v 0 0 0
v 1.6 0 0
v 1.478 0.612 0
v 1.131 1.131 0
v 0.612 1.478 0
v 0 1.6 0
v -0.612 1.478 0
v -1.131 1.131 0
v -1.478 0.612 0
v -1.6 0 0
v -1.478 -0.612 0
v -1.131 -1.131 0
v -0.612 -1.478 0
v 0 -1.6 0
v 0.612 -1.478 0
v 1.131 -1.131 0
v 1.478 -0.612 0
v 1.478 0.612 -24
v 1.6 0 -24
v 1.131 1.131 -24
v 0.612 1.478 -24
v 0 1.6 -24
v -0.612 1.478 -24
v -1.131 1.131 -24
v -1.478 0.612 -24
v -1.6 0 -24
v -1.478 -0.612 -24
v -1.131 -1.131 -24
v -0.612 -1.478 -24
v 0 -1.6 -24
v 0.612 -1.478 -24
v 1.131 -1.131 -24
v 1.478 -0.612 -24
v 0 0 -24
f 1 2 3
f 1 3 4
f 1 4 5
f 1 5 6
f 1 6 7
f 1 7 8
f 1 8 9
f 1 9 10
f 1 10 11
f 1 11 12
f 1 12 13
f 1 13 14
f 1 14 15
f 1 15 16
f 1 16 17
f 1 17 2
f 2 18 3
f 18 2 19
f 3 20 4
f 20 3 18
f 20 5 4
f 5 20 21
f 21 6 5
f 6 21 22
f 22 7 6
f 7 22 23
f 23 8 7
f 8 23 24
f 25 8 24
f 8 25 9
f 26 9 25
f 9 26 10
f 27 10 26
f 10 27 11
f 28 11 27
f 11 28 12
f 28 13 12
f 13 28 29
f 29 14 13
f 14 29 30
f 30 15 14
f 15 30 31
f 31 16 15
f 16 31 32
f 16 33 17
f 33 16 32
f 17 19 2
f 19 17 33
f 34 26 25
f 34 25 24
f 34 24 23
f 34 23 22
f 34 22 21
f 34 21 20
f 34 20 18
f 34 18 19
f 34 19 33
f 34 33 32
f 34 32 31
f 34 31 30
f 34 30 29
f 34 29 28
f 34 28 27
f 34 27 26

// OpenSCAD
// file: ../p/4-4edge.scad
use <../lib.scad>
function ldraw_lib__4_4edge() = [
// 0 Circle 1.0
// 0 Name: 4-4edge.dat
// 0 Author: James Jessiman
// 0 !LDRAW_ORG Primitive UPDATE 2017-01
// 0 !LICENSE Licensed under CC BY 2.0 and CC BY 4.0 : see CAreadme.txt
// 
// 0 BFC CERTIFY CCW
  [0,"BFC","CERTIFY"],
  [0,"BFC","CCW"],
// 
// 0 !HISTORY 1998-12-15 [PTadmin] Official Update 1998-10
// 0 !HISTORY 2005-12-28 [PTadmin] Official Update 2005-01
// 0 !HISTORY 2007-06-24 [PTadmin] Header formatted for Contributor Agreement
// 0 !HISTORY 2008-07-01 [PTadmin] Official Update 2008-01
// 0 !HISTORY 2017-01-15 [Steffen] BFCed
// 0 !HISTORY 2017-12-30 [PTadmin] Official Update 2017-01
// 
// 
// 2 24 1 0 0 0.9239 0 0.3827
  [2,24,1,0,0,0.9239,0,0.3827],
// 2 24 0.9239 0 0.3827 0.7071 0 0.7071
  [2,24,0.9239,0,0.3827,0.7071,0,0.7071],
// 2 24 0.7071 0 0.7071 0.3827 0 0.9239
  [2,24,0.7071,0,0.7071,0.3827,0,0.9239],
// 2 24 0.3827 0 0.9239 0 0 1
  [2,24,0.3827,0,0.9239,0,0,1],
// 2 24 0 0 1 -0.3827 0 0.9239
  [2,24,0,0,1,-0.3827,0,0.9239],
// 2 24 -0.3827 0 0.9239 -0.7071 0 0.7071
  [2,24,-0.3827,0,0.9239,-0.7071,0,0.7071],
// 2 24 -0.7071 0 0.7071 -0.9239 0 0.3827
  [2,24,-0.7071,0,0.7071,-0.9239,0,0.3827],
// 2 24 -0.9239 0 0.3827 -1 0 -0
  [2,24,-0.9239,0,0.3827,-1,0,-0],
// 2 24 -1 0 -0 -0.9239 0 -0.3827
  [2,24,-1,0,-0,-0.9239,0,-0.3827],
// 2 24 -0.9239 0 -0.3827 -0.7071 0 -0.7071
  [2,24,-0.9239,0,-0.3827,-0.7071,0,-0.7071],
// 2 24 -0.7071 0 -0.7071 -0.3827 0 -0.9239
  [2,24,-0.7071,0,-0.7071,-0.3827,0,-0.9239],
// 2 24 -0.3827 0 -0.9239 0 0 -1
  [2,24,-0.3827,0,-0.9239,0,0,-1],
// 2 24 0 0 -1 0.3827 0 -0.9239
  [2,24,0,0,-1,0.3827,0,-0.9239],
// 2 24 0.3827 0 -0.9239 0.7071 0 -0.7071
  [2,24,0.3827,0,-0.9239,0.7071,0,-0.7071],
// 2 24 0.7071 0 -0.7071 0.9239 0 -0.3827
  [2,24,0.7071,0,-0.7071,0.9239,0,-0.3827],
// 2 24 0.9239 0 -0.3827 1 0 0
  [2,24,0.9239,0,-0.3827,1,0,0],
];
makepoly(ldraw_lib__4_4edge(), line=0.2);
// file: ../p/4-4disc.scad
use <../lib.scad>
function ldraw_lib__4_4disc() = [
// 0 Disc 1.0
// 0 Name: 4-4disc.dat
// 0 Author: James Jessiman
// 0 !LDRAW_ORG Primitive UPDATE 2002-02
// 0 !LICENSE Licensed under CC BY 2.0 and CC BY 4.0 : see CAreadme.txt
// 
// 0 BFC CERTIFY CCW
  [0,"BFC","CERTIFY"],
  [0,"BFC","CCW"],
// 
// 0 !HISTORY 1998-12-15 [PTadmin] Official Update 1998-10
// 0 !HISTORY 2002-03-23 [sbliss] Added BFC statement
// 0 !HISTORY 2002-04-25 [PTadmin] Official Update 2002-02
// 0 !HISTORY 2007-06-24 [PTadmin] Header formatted for Contributor Agreement
// 0 !HISTORY 2008-07-01 [PTadmin] Official Update 2008-01
// 
// 
// 3 16 0 0 0 1 0 0 0.9239 0 0.3827
  [3,16,0,0,0,1,0,0,0.9239,0,0.3827],
// 3 16 0 0 0 0.9239 0 0.3827 0.7071 0 0.7071
  [3,16,0,0,0,0.9239,0,0.3827,0.7071,0,0.7071],
// 3 16 0 0 0 0.7071 0 0.7071 0.3827 0 0.9239
  [3,16,0,0,0,0.7071,0,0.7071,0.3827,0,0.9239],
// 3 16 0 0 0 0.3827 0 0.9239 0 0 1
  [3,16,0,0,0,0.3827,0,0.9239,0,0,1],
// 3 16 0 0 0 0 0 1 -0.3827 0 0.9239
  [3,16,0,0,0,0,0,1,-0.3827,0,0.9239],
// 3 16 0 0 0 -0.3827 0 0.9239 -0.7071 0 0.7071
  [3,16,0,0,0,-0.3827,0,0.9239,-0.7071,0,0.7071],
// 3 16 0 0 0 -0.7071 0 0.7071 -0.9239 0 0.3827
  [3,16,0,0,0,-0.7071,0,0.7071,-0.9239,0,0.3827],
// 3 16 0 0 0 -0.9239 0 0.3827 -1 0 -0
  [3,16,0,0,0,-0.9239,0,0.3827,-1,0,-0],
// 3 16 0 0 0 -1 0 -0 -0.9239 0 -0.3827
  [3,16,0,0,0,-1,0,-0,-0.9239,0,-0.3827],
// 3 16 0 0 0 -0.9239 0 -0.3827 -0.7071 0 -0.7071
  [3,16,0,0,0,-0.9239,0,-0.3827,-0.7071,0,-0.7071],
// 3 16 0 0 0 -0.7071 0 -0.7071 -0.3827 0 -0.9239
  [3,16,0,0,0,-0.7071,0,-0.7071,-0.3827,0,-0.9239],
// 3 16 0 0 0 -0.3827 0 -0.9239 0 0 -1
  [3,16,0,0,0,-0.3827,0,-0.9239,0,0,-1],
// 3 16 0 0 0 0 0 -1 0.3827 0 -0.9239
  [3,16,0,0,0,0,0,-1,0.3827,0,-0.9239],
// 3 16 0 0 0 0.3827 0 -0.9239 0.7071 0 -0.7071
  [3,16,0,0,0,0.3827,0,-0.9239,0.7071,0,-0.7071],
// 3 16 0 0 0 0.7071 0 -0.7071 0.9239 0 -0.3827
  [3,16,0,0,0,0.7071,0,-0.7071,0.9239,0,-0.3827],
// 3 16 0 0 0 0.9239 0 -0.3827 1 0 0
  [3,16,0,0,0,0.9239,0,-0.3827,1,0,0],
// 0
];
makepoly(ldraw_lib__4_4disc(), line=0.2);
// file: ../p/4-4cyli.scad
use <../lib.scad>
function ldraw_lib__4_4cyli() = [
// 0 Cylinder 1.0
// 0 Name: 4-4cyli.dat
// 0 Author: James Jessiman
// 0 !LDRAW_ORG Primitive UPDATE 2005-01
// 0 !LICENSE Licensed under CC BY 2.0 and CC BY 4.0 : see CAreadme.txt
// 
// 0 BFC CERTIFY CCW
  [0,"BFC","CERTIFY"],
  [0,"BFC","CCW"],
// 
// 0 !HISTORY 1998-12-15 [PTadmin] Official Update 1998-10
// 0 !HISTORY 2002-03-23 [sbliss] Added BFC statement; merged headers from files in distributions LDraw 0.27 and Complete.
// 0 !HISTORY 2002-04-25 [PTadmin] Official Update 2002-02
// 0 !HISTORY 2004-12-14 [guyvivan] BFC CCW
// 0 !HISTORY 2005-12-28 [PTadmin] Official Update 2005-01
// 0 !HISTORY 2007-06-24 [PTadmin] Header formatted for Contributor Agreement
// 0 !HISTORY 2008-07-01 [PTadmin] Official Update 2008-01
// 
// 
// 4 16 1 1 0 0.9239 1 0.3827 0.9239 0 0.3827 1 0 0
  [4,16,1,1,0,0.9239,1,0.3827,0.9239,0,0.3827,1,0,0],
// 5 24 1 0 0 1 1 0 0.9239 0 0.3827 0.9239 0 -0.3827
  [5,24,1,0,0,1,1,0,0.9239,0,0.3827,0.9239,0,-0.3827],
// 4 16 0.9239 1 0.3827 0.7071 1 0.7071 0.7071 0 0.7071 0.9239 0 0.3827
  [4,16,0.9239,1,0.3827,0.7071,1,0.7071,0.7071,0,0.7071,0.9239,0,0.3827],
// 5 24 0.9239 0 0.3827 0.9239 1 0.3827 0.7071 0 0.7071 1 0 0
  [5,24,0.9239,0,0.3827,0.9239,1,0.3827,0.7071,0,0.7071,1,0,0],
// 4 16 0.7071 1 0.7071 0.3827 1 0.9239 0.3827 0 0.9239 0.7071 0 0.7071
  [4,16,0.7071,1,0.7071,0.3827,1,0.9239,0.3827,0,0.9239,0.7071,0,0.7071],
// 5 24 0.7071 0 0.7071 0.7071 1 0.7071 0.3827 0 0.9239 0.9239 0 0.3827
  [5,24,0.7071,0,0.7071,0.7071,1,0.7071,0.3827,0,0.9239,0.9239,0,0.3827],
// 4 16 0.3827 1 0.9239 0 1 1 0 0 1 0.3827 0 0.9239
  [4,16,0.3827,1,0.9239,0,1,1,0,0,1,0.3827,0,0.9239],
// 5 24 0.3827 0 0.9239 0.3827 1 0.9239 0 0 1 0.7071 0 0.7071
  [5,24,0.3827,0,0.9239,0.3827,1,0.9239,0,0,1,0.7071,0,0.7071],
// 4 16 0 1 1 -0.3827 1 0.9239 -0.3827 0 0.9239 0 0 1
  [4,16,0,1,1,-0.3827,1,0.9239,-0.3827,0,0.9239,0,0,1],
// 5 24 0 0 1 0 1 1 -0.3827 0 0.9239 0.3827 0 0.9239
  [5,24,0,0,1,0,1,1,-0.3827,0,0.9239,0.3827,0,0.9239],
// 4 16 -0.3827 1 0.9239 -0.7071 1 0.7071 -0.7071 0 0.7071 -0.3827 0 0.9239
  [4,16,-0.3827,1,0.9239,-0.7071,1,0.7071,-0.7071,0,0.7071,-0.3827,0,0.9239],
// 5 24 -0.3827 0 0.9239 -0.3827 1 0.9239 -0.7071 0 0.7071 0 0 1
  [5,24,-0.3827,0,0.9239,-0.3827,1,0.9239,-0.7071,0,0.7071,0,0,1],
// 4 16 -0.7071 1 0.7071 -0.9239 1 0.3827 -0.9239 0 0.3827 -0.7071 0 0.7071
  [4,16,-0.7071,1,0.7071,-0.9239,1,0.3827,-0.9239,0,0.3827,-0.7071,0,0.7071],
// 5 24 -0.7071 0 0.7071 -0.7071 1 0.7071 -0.9239 0 0.3827 -0.3827 0 0.9239
  [5,24,-0.7071,0,0.7071,-0.7071,1,0.7071,-0.9239,0,0.3827,-0.3827,0,0.9239],
// 4 16 -0.9239 1 0.3827 -1 1 0 -1 0 0 -0.9239 0 0.3827
  [4,16,-0.9239,1,0.3827,-1,1,0,-1,0,0,-0.9239,0,0.3827],
// 5 24 -0.9239 0 0.3827 -0.9239 1 0.3827 -1 0 0 -0.7071 0 0.7071
  [5,24,-0.9239,0,0.3827,-0.9239,1,0.3827,-1,0,0,-0.7071,0,0.7071],
// 4 16 -1 1 0 -0.9239 1 -0.3827 -0.9239 0 -0.3827 -1 0 0
  [4,16,-1,1,0,-0.9239,1,-0.3827,-0.9239,0,-0.3827,-1,0,0],
// 5 24 -1 0 0 -1 1 0 -0.9239 0 -0.3827 -0.9239 0 0.3827
  [5,24,-1,0,0,-1,1,0,-0.9239,0,-0.3827,-0.9239,0,0.3827],
// 4 16 -0.9239 1 -0.3827 -0.7071 1 -0.7071 -0.7071 0 -0.7071 -0.9239 0 -0.3827
  [4,16,-0.9239,1,-0.3827,-0.7071,1,-0.7071,-0.7071,0,-0.7071,-0.9239,0,-0.3827],
// 5 24 -0.9239 0 -0.3827 -0.9239 1 -0.3827 -0.7071 0 -0.7071 -1 0 0
  [5,24,-0.9239,0,-0.3827,-0.9239,1,-0.3827,-0.7071,0,-0.7071,-1,0,0],
// 4 16 -0.7071 1 -0.7071 -0.3827 1 -0.9239 -0.3827 0 -0.9239 -0.7071 0 -0.7071
  [4,16,-0.7071,1,-0.7071,-0.3827,1,-0.9239,-0.3827,0,-0.9239,-0.7071,0,-0.7071],
// 5 24 -0.7071 0 -0.7071 -0.7071 1 -0.7071 -0.3827 0 -0.9239 -0.9239 0 -0.3827
  [5,24,-0.7071,0,-0.7071,-0.7071,1,-0.7071,-0.3827,0,-0.9239,-0.9239,0,-0.3827],
// 4 16 -0.3827 1 -0.9239 0 1 -1 0 0 -1 -0.3827 0 -0.9239
  [4,16,-0.3827,1,-0.9239,0,1,-1,0,0,-1,-0.3827,0,-0.9239],
// 5 24 -0.3827 0 -0.9239 -0.3827 1 -0.9239 0 0 -1 -0.7071 0 -0.7071
  [5,24,-0.3827,0,-0.9239,-0.3827,1,-0.9239,0,0,-1,-0.7071,0,-0.7071],
// 4 16 0 1 -1 0.3827 1 -0.9239 0.3827 0 -0.9239 0 0 -1
  [4,16,0,1,-1,0.3827,1,-0.9239,0.3827,0,-0.9239,0,0,-1],
// 5 24 0 0 -1 0 1 -1 0.3827 0 -0.9239 -0.3827 0 -0.9239
  [5,24,0,0,-1,0,1,-1,0.3827,0,-0.9239,-0.3827,0,-0.9239],
// 4 16 0.3827 1 -0.9239 0.7071 1 -0.7071 0.7071 0 -0.7071 0.3827 0 -0.9239
  [4,16,0.3827,1,-0.9239,0.7071,1,-0.7071,0.7071,0,-0.7071,0.3827,0,-0.9239],
// 5 24 0.3827 0 -0.9239 0.3827 1 -0.9239 0.7071 0 -0.7071 0 0 -1
  [5,24,0.3827,0,-0.9239,0.3827,1,-0.9239,0.7071,0,-0.7071,0,0,-1],
// 4 16 0.7071 1 -0.7071 0.9239 1 -0.3827 0.9239 0 -0.3827 0.7071 0 -0.7071
  [4,16,0.7071,1,-0.7071,0.9239,1,-0.3827,0.9239,0,-0.3827,0.7071,0,-0.7071],
// 5 24 0.7071 0 -0.7071 0.7071 1 -0.7071 0.9239 0 -0.3827 0.3827 0 -0.9239
  [5,24,0.7071,0,-0.7071,0.7071,1,-0.7071,0.9239,0,-0.3827,0.3827,0,-0.9239],
// 4 16 0.9239 1 -0.3827 1 1 0 1 0 0 0.9239 0 -0.3827
  [4,16,0.9239,1,-0.3827,1,1,0,1,0,0,0.9239,0,-0.3827],
// 5 24 0.9239 0 -0.3827 0.9239 1 -0.3827 1 0 0 0.7071 0 -0.7071
  [5,24,0.9239,0,-0.3827,0.9239,1,-0.3827,1,0,0,0.7071,0,-0.7071],
// 0
];
makepoly(ldraw_lib__4_4cyli(), line=0.2);
// main file
use <../lib.scad>
use <../p/4-4cyli.scad>
use <../p/4-4disc.scad>
use <../p/4-4edge.scad>
function ldraw_lib__87994() = [
// 0 Bar  3L
// 0 Name: 87994.dat
// 0 Author: Chris Dee [cwdee]
// 0 !LDRAW_ORG Part UPDATE 2015-01
// 0 !LICENSE Licensed under CC BY 2.0 and CC BY 4.0 : see CAreadme.txt
// 
// 0 BFC CERTIFY CW
  [0,"BFC","CERTIFY"],
  [0,"BFC","CW"],
// 
// 0 !HISTORY 2010-12-31 [PTadmin] Official Update 2010-03
// 0 !HISTORY 2015-07-09 [cwdee] Adjusted description
// 0 !HISTORY 2015-10-11 [PTadmin] Official Update 2015-01
// 
// 
// 1 16 0 0 0 4 0 0 0 1 0 0 0 4 4-4edge.dat
  [1,16,0,0,0,4,0,0,0,1,0,0,0,4, ldraw_lib__4_4edge()],
// 1 16 0 0 0 4 0 0 0 1 0 0 0 4 4-4disc.dat
  [1,16,0,0,0,4,0,0,0,1,0,0,0,4, ldraw_lib__4_4disc()],
// 1 16 0 0 0 4 0 0 0 60 0 0 0 4 4-4cyli.dat
  [1,16,0,0,0,4,0,0,0,60,0,0,0,4, ldraw_lib__4_4cyli()],
// 1 16 0 60 0 4 0 0 0 1 0 0 0 4 4-4edge.dat
  [1,16,0,60,0,4,0,0,0,1,0,0,0,4, ldraw_lib__4_4edge()],
// 1 16 0 60 0 -4 0 0 0 -1 0 0 0 4 4-4disc.dat
  [1,16,0,60,0,-4,0,0,0,-1,0,0,0,4, ldraw_lib__4_4disc()],
// 0
];
makepoly(ldraw_lib__87994(), line=0.2);
